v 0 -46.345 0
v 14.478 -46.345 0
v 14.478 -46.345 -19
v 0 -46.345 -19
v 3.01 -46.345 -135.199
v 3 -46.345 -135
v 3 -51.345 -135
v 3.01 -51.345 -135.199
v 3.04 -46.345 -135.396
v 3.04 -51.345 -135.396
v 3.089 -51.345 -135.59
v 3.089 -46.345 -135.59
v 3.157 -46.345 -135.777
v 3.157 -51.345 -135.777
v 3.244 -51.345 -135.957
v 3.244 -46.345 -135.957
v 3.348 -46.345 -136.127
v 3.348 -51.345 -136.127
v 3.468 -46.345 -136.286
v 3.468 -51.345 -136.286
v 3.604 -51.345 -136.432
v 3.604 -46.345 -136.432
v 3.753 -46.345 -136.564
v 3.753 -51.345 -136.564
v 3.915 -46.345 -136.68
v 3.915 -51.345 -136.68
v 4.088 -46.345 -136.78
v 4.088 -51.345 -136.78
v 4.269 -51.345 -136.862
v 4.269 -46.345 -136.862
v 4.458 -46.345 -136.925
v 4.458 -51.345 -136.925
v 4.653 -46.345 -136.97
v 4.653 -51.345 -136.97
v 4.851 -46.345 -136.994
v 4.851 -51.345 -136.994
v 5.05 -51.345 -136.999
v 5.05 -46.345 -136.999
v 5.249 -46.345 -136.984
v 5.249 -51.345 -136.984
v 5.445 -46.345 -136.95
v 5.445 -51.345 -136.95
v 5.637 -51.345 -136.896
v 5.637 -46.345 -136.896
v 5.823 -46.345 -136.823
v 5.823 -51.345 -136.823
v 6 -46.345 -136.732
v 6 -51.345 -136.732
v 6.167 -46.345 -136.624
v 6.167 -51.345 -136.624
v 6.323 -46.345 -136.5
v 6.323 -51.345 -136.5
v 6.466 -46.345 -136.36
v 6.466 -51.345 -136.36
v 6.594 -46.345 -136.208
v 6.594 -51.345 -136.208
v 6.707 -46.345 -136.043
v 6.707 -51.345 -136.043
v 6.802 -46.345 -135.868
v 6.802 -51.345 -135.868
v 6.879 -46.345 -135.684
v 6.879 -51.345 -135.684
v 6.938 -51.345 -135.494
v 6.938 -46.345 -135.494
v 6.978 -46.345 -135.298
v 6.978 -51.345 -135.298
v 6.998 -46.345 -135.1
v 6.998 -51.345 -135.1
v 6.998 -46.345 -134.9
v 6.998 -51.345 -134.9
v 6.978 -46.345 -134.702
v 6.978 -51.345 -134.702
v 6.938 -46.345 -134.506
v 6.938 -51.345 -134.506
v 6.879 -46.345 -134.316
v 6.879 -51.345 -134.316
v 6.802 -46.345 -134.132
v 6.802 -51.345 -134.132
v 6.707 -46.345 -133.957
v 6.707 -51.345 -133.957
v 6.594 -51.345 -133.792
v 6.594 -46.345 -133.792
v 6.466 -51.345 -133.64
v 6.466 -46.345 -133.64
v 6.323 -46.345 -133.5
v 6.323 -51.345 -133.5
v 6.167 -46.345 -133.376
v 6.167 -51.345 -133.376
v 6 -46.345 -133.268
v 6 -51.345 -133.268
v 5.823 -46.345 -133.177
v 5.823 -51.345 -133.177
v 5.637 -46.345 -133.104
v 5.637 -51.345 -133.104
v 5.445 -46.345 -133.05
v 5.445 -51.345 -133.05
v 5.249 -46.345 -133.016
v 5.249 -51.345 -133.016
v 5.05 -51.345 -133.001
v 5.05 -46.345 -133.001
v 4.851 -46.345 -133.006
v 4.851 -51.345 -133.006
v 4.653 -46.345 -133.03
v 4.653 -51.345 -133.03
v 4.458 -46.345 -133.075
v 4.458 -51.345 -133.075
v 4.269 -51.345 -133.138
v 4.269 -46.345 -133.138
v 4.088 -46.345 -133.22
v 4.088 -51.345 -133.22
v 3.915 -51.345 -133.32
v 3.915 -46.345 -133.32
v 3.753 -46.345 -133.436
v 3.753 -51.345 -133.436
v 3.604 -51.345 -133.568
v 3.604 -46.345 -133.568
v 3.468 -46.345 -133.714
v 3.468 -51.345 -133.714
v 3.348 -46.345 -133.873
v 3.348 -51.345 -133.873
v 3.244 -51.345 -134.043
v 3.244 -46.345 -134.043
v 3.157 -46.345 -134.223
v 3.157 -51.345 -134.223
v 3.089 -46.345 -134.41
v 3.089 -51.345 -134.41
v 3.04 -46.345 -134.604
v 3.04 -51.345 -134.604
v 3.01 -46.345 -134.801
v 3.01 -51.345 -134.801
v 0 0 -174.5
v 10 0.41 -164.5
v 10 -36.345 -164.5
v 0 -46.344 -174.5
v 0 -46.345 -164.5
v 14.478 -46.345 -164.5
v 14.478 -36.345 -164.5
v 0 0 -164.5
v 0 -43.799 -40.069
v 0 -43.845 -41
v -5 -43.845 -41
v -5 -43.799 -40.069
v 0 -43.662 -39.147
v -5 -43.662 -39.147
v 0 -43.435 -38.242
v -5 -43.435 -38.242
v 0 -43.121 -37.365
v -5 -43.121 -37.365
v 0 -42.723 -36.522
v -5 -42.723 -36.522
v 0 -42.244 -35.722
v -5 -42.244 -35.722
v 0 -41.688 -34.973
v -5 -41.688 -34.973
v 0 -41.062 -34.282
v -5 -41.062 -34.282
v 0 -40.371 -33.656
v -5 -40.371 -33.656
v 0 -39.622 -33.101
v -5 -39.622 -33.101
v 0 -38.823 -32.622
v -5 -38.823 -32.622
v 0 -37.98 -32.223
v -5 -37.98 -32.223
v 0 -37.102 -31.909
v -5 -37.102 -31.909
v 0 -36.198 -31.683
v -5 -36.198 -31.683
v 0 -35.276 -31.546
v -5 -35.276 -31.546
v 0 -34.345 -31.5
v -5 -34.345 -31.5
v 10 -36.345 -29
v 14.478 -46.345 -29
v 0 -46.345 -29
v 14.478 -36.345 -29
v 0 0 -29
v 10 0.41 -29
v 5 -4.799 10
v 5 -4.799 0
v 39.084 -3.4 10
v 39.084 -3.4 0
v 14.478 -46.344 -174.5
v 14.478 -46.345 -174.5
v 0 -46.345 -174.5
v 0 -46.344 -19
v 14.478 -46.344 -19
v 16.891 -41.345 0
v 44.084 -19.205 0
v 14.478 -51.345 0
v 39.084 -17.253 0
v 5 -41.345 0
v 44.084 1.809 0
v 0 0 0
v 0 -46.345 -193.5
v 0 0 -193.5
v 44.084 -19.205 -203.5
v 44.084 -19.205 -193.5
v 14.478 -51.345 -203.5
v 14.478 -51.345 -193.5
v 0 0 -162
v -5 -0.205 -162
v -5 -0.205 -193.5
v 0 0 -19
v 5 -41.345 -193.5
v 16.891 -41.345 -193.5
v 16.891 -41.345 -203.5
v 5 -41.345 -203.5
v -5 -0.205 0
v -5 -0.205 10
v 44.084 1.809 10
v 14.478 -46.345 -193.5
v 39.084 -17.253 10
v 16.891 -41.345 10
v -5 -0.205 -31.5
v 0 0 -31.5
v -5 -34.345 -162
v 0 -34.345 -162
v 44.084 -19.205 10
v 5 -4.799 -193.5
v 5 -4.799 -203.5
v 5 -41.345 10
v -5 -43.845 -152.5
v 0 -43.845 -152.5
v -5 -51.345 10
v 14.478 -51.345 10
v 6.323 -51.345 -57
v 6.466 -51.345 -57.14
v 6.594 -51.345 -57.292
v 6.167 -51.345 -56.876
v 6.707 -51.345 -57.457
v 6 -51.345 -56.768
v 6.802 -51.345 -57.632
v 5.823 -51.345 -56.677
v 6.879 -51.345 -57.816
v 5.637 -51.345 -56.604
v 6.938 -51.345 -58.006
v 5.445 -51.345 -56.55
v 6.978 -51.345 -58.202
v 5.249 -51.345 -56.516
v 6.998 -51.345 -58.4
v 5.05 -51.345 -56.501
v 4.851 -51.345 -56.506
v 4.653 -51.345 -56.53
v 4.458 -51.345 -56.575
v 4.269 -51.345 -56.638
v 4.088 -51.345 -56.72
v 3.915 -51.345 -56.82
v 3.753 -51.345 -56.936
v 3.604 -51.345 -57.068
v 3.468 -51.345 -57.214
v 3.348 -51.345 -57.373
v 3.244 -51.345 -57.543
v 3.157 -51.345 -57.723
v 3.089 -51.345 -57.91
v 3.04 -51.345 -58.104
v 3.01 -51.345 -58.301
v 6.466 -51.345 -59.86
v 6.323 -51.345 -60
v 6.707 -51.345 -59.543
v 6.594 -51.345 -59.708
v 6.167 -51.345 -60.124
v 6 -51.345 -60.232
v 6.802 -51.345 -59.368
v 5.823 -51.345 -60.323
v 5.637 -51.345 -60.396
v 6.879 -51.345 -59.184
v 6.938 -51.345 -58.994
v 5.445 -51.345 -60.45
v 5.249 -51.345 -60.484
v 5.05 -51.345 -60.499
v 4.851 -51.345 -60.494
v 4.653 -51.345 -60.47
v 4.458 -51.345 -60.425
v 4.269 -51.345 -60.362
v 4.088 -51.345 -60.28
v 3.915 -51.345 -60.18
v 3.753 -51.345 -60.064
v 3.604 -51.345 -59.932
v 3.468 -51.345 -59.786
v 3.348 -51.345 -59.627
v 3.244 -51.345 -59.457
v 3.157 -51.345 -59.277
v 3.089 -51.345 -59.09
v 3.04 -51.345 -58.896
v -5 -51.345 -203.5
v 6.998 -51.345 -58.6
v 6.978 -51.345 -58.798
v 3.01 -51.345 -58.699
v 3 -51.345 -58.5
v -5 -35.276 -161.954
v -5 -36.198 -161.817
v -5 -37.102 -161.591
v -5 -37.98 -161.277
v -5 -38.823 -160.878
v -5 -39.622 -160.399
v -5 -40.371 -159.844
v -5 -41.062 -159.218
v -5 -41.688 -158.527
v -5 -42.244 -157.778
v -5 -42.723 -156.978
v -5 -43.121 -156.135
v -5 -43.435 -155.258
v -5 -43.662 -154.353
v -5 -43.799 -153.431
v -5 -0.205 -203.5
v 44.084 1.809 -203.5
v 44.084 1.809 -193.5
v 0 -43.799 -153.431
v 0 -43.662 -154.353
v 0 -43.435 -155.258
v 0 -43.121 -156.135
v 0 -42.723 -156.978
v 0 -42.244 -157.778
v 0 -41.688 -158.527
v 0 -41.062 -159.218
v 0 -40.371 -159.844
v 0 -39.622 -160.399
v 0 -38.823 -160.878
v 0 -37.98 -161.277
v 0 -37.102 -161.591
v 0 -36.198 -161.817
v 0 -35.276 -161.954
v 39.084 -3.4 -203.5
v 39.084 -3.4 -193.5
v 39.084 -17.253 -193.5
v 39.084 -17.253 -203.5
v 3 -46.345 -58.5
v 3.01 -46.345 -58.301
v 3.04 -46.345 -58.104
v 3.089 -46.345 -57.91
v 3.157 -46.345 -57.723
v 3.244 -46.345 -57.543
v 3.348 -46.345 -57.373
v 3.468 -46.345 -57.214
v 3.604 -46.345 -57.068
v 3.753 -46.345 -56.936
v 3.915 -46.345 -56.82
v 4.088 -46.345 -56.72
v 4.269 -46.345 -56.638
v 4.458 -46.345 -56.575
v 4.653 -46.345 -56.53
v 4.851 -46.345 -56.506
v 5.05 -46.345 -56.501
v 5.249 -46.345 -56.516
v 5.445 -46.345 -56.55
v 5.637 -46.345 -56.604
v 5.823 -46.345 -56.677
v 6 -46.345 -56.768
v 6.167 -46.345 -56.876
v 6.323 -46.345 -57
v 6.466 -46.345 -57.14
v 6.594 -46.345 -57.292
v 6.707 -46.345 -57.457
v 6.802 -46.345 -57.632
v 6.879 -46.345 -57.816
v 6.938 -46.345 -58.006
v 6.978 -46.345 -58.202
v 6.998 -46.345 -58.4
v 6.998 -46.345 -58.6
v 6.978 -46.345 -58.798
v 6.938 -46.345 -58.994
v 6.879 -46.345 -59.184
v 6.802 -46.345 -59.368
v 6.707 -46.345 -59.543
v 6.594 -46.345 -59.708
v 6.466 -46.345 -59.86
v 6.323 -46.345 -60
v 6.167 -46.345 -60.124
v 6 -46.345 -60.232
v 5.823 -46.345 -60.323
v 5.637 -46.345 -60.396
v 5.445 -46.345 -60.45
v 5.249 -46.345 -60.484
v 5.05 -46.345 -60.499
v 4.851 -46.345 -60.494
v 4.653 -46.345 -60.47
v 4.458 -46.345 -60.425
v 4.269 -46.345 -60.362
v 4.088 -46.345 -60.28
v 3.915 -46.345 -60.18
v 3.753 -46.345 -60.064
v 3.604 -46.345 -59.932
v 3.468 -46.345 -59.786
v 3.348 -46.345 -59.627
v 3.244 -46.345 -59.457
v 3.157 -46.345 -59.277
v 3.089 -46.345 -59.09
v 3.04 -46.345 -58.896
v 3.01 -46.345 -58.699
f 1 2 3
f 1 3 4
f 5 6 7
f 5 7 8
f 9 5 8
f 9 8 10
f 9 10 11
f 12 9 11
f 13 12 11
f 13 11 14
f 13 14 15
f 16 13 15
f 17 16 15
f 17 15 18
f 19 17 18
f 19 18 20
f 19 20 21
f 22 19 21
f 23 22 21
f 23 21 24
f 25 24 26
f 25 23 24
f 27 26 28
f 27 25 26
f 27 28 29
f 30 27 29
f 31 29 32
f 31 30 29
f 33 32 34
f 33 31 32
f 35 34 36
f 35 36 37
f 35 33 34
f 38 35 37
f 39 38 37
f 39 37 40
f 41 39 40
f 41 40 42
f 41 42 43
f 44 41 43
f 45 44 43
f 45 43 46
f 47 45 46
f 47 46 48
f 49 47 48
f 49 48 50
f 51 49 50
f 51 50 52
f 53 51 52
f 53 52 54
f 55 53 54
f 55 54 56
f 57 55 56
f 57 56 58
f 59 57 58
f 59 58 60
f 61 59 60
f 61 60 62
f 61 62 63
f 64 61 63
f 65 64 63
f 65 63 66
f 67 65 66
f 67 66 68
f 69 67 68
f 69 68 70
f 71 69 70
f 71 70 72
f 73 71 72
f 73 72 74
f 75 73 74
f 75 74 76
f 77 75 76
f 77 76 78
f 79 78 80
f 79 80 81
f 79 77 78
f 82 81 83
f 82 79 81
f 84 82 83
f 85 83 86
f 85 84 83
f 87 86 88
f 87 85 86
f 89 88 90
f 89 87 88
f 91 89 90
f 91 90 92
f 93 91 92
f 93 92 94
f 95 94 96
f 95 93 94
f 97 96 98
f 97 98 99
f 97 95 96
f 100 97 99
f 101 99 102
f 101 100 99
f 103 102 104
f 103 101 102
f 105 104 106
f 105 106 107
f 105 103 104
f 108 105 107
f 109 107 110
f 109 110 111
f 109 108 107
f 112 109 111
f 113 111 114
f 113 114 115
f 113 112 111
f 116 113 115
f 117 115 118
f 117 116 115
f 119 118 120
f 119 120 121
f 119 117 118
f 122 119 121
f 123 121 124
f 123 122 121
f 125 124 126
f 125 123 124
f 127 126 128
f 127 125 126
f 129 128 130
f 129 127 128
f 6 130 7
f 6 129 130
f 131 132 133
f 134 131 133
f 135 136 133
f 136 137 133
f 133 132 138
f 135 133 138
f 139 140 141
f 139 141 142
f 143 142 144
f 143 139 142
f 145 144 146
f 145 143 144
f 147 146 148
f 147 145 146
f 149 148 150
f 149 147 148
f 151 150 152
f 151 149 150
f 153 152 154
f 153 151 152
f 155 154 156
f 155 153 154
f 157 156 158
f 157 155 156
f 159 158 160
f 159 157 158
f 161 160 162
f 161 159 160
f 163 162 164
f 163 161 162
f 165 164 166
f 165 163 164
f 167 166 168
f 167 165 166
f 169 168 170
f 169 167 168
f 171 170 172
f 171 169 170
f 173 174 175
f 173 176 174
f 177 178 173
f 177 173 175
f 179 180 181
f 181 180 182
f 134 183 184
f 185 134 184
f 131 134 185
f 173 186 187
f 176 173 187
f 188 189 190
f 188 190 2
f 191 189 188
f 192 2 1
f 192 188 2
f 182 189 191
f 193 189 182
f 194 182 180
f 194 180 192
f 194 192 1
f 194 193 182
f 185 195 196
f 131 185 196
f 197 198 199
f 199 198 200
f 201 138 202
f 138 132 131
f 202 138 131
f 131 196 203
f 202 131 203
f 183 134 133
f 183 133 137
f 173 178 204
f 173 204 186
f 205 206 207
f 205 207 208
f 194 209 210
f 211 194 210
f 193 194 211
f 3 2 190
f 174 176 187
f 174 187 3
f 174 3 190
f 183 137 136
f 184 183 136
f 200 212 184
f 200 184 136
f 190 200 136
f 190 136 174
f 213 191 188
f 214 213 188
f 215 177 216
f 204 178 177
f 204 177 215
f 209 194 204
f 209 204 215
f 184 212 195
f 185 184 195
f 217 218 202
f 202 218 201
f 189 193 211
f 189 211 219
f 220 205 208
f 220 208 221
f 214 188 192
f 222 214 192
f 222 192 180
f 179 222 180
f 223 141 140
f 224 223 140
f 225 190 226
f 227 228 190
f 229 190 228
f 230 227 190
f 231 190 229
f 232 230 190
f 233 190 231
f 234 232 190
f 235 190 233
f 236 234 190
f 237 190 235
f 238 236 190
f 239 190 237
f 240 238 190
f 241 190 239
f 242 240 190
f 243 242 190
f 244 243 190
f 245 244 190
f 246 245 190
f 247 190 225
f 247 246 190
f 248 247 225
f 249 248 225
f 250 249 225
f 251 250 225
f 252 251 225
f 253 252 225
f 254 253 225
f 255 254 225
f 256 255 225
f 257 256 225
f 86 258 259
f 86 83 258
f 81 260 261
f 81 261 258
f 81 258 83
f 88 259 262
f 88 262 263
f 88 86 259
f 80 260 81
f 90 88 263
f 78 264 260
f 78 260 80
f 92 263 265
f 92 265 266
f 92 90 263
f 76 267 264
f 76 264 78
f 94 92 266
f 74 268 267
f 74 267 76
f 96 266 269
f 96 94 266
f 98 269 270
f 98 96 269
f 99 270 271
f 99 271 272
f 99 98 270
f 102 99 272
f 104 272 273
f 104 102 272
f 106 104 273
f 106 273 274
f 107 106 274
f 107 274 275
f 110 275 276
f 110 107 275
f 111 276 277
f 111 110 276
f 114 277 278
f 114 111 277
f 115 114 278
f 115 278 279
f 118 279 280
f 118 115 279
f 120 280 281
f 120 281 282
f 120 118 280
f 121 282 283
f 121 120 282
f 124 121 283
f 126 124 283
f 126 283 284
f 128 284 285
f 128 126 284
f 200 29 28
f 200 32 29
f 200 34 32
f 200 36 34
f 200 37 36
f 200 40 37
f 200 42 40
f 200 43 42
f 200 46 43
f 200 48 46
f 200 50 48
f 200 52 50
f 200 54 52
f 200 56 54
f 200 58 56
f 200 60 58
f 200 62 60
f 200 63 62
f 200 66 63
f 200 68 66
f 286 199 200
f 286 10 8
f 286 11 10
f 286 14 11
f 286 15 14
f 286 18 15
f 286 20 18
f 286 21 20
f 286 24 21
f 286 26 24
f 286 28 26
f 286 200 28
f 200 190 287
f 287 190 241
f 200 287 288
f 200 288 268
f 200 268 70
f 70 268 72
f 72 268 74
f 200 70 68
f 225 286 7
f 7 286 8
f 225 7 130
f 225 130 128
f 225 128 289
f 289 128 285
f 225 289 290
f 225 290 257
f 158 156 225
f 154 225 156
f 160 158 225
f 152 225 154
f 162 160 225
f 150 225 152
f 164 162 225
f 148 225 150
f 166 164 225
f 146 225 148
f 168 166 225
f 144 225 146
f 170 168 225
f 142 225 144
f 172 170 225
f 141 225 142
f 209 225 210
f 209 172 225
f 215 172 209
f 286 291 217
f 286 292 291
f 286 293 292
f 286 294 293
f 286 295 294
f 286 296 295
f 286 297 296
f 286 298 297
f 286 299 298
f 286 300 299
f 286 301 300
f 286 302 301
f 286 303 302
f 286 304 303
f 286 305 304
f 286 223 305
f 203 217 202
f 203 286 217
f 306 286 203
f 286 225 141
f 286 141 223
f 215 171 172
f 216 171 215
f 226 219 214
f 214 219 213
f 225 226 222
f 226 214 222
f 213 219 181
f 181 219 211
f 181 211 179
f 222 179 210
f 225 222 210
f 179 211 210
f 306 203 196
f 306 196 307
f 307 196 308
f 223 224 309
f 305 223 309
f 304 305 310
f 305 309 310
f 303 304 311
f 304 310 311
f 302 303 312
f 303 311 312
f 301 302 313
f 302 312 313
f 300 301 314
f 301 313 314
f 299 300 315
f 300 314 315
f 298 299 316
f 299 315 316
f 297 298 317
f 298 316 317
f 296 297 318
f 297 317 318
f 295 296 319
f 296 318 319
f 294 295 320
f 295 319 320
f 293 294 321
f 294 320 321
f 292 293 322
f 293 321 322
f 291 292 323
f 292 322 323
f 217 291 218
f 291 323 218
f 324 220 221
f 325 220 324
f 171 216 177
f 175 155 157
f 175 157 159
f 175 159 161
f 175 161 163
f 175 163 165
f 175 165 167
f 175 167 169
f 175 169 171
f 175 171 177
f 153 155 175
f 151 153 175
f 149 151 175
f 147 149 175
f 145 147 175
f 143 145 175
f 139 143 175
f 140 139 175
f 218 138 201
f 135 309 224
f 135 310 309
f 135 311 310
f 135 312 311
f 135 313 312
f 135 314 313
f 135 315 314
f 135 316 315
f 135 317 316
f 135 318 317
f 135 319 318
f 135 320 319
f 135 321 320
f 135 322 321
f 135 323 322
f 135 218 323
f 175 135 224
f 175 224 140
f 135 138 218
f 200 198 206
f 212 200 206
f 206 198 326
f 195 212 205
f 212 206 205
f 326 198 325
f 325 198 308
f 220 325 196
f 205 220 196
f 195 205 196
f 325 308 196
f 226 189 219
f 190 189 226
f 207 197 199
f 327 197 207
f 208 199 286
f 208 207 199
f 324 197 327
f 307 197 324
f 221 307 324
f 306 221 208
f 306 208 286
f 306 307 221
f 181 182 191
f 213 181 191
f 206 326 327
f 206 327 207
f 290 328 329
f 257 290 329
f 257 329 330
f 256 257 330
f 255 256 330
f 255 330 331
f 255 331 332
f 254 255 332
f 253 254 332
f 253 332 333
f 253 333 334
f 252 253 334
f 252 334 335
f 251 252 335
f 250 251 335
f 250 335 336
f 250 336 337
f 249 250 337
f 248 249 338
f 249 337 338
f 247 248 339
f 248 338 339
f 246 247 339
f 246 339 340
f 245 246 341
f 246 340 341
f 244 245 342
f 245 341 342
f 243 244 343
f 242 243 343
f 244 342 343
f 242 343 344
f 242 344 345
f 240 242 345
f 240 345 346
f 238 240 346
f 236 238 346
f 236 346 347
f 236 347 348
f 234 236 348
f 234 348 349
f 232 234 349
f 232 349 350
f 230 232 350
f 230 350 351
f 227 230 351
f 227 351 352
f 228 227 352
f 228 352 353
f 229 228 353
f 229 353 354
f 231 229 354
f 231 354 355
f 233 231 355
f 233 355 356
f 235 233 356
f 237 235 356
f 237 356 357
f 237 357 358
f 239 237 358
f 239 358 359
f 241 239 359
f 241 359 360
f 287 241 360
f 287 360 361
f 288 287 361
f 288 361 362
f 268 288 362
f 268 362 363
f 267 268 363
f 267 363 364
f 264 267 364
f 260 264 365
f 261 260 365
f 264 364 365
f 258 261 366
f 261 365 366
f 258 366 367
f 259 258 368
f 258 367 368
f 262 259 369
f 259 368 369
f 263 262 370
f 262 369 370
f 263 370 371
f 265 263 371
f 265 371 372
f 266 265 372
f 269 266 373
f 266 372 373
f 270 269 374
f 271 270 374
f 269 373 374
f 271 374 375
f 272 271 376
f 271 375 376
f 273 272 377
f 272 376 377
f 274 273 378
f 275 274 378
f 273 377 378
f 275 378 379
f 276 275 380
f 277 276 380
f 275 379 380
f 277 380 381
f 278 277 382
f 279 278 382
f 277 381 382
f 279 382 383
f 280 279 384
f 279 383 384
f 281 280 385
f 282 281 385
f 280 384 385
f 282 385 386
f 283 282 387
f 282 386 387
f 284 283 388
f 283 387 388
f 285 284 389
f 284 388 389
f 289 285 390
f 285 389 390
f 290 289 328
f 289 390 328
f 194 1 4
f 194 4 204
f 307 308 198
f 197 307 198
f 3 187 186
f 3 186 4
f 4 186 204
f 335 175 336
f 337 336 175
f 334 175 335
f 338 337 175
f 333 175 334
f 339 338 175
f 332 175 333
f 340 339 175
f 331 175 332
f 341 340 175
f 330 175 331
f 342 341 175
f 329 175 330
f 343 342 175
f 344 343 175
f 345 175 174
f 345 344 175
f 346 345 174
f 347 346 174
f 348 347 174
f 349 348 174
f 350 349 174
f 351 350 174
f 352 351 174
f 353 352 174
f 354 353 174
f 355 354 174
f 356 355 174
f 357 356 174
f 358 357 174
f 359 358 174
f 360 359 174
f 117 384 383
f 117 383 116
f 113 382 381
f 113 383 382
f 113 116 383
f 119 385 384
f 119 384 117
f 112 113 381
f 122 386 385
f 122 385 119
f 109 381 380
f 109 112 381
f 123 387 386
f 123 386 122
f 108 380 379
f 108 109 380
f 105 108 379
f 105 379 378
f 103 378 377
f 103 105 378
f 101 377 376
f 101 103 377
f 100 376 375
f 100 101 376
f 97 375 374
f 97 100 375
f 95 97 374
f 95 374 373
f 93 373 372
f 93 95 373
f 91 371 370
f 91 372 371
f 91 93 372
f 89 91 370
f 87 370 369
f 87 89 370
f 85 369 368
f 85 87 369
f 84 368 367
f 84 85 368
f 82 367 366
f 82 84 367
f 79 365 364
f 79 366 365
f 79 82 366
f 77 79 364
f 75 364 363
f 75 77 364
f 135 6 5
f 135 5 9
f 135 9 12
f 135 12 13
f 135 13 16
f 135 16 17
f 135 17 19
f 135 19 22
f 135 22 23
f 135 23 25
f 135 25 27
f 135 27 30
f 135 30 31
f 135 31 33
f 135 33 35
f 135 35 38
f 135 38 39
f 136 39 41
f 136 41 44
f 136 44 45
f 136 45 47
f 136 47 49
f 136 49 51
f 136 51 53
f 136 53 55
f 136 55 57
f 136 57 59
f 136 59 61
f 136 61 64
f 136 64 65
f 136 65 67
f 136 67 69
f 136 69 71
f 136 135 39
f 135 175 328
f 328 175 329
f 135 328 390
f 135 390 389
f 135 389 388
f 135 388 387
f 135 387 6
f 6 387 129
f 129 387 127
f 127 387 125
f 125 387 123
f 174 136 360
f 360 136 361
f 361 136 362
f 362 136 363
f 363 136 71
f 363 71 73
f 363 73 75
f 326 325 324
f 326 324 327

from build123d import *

# Parameters (mm, degrees)
BOSS_EXTRUDE1_DEPTH  = 10
BOSS_EXTRUDE6_DEPTH  = 41
CUT_EXTRUDE1_REACH   = 81.124
CUT_EXTRUDE2_REACH   = 81.124
BOSS_EXTRUDE9_DEPTH  = 10
CHAMFER3_SIZE        = 10
BOSS_EXTRUDE10_DEPTH = 55.75
CUT_EXTRUDE3_REACH   = 118.716
SKETCH12_R           = 2


with BuildPart() as part:
    # Sketch2 → Boss-Extrude1 (new body)
    with BuildSketch(Plane.XY):
        Polygon((-5, -51.344559606), (-5, -0.20517252), (44.083730464, 1.808954014), (44.083730464, -19.205040291), (14.477900916, -51.344559606), align=None)
    extrude(amount=BOSS_EXTRUDE1_DEPTH)

    # Sketch2<5> → Boss-Extrude6 (add)
    with BuildSketch(Plane.XY):
        Polygon((-5, -51.344559606), (14.477900916, -51.344559606), (14.477900916, -46.344559606), (0, -46.344559606), (0, 0), (-5, -0.20517252), align=None)
    extrude(amount=-BOSS_EXTRUDE6_DEPTH)

    # Sketch6 → Cut-Extrude1 (cut, up to next)
    with BuildSketch(Plane(origin=(0, 0, 0), x_dir=(0, 0, -1), z_dir=(1, 0, 0)), mode=Mode.PRIVATE) as cut_extrude1_sk1:
        with BuildLine():
            Line((31.5, 0), (41, 0))
            Line((41, 0), (41, -24.844559606))
            ThreePointArc((41, -24.844559606), (47.717514421, -41.062074027), (31.5, -34.344559606))
            Line((31.5, -34.344559606), (31.5, 0))
        make_face()
    cut_extrude1_tool1 = extrude(cut_extrude1_sk1.sketch, amount=-CUT_EXTRUDE1_REACH, mode=Mode.PRIVATE) & part.part
    add(cut_extrude1_tool1.solids().sort_by_distance((0, -24.478408, -38.654556))[0], mode=Mode.SUBTRACT)

    # Sketch7 → Cut-Extrude2 (cut, up to next)
    with BuildSketch(Plane(origin=(0, 0, 0), x_dir=(-1, 0, 0), z_dir=(0, 0, -1)), mode=Mode.PRIVATE) as cut_extrude2_sk1:
        Polygon((-39.083730464, -17.253097249), (-16.891496625, -41.344559606), (-5, -41.344559606), (-5, -4.799035286), (-39.083730464, -3.400426311), align=None)
    cut_extrude2_tool1 = extrude(cut_extrude2_sk1.sketch, amount=-CUT_EXTRUDE2_REACH, mode=Mode.PRIVATE) & part.part
    add(cut_extrude2_tool1.solids().sort_by_distance((19.604261, -19.893914, 0))[0], mode=Mode.SUBTRACT)

    # Sketch10 → Boss-Extrude9 (add)
    with BuildSketch(Plane.XY.offset(-29)):
        Polygon((14.477900916, -46.344559606), (0, -46.344559606), (0, 0), (10, 0.41034504), (10, -36.344559606), (14.477900916, -36.344559606), align=None)
    extrude(amount=BOSS_EXTRUDE9_DEPTH)

    # Chamfer3
    chamfer3_edges = [part.edges().sort_by_distance(p)[0] for p in [
        (12.238950458, -36.344559606, -19),
        (10, -17.967107283, -19),
    ]]
    chamfer(chamfer3_edges, length=CHAMFER3_SIZE - 0.0001)  # a hair under: the kernel refuses the full size

    # Sketch11 → Boss-Extrude10 (add)
    with BuildSketch(Plane(origin=(0, 0, -41), x_dir=(-1, 0, 0), z_dir=(0, 0, -1))):
        Polygon((5, -51.344559606), (5, -43.844559606), (0, -43.844559606), (0, -46.344559606), (-14.477900916, -46.344559606), (-14.477900916, -51.344559606), align=None)
    extrude(amount=BOSS_EXTRUDE10_DEPTH)

    # Sketch12 → Cut-Extrude3 (cut, up to next)
    with BuildSketch(Plane(origin=(0, -46.344559606, 0), x_dir=(1, 0, 0), z_dir=(0, 1, 0)), mode=Mode.PRIVATE) as cut_extrude3_sk1:
        with Locations(Location((5, 58.5, 0), (0, 0, 180))):
            Circle(SKETCH12_R)
    cut_extrude3_tool1 = extrude(cut_extrude3_sk1.sketch, amount=-CUT_EXTRUDE3_REACH, mode=Mode.PRIVATE) & part.part
    add(cut_extrude3_tool1.solids().sort_by_distance((5, -46.34456, -58.5))[0], mode=Mode.SUBTRACT)

    # Mirror3: part across plane


with BuildPart() as part_1:
    add(part.part)
    add(part.part.mirror(Plane(origin=(0, 0, -96.75), x_dir=(1, 0, 0), z_dir=(0, 0, -1))))


solid = part_1.part
